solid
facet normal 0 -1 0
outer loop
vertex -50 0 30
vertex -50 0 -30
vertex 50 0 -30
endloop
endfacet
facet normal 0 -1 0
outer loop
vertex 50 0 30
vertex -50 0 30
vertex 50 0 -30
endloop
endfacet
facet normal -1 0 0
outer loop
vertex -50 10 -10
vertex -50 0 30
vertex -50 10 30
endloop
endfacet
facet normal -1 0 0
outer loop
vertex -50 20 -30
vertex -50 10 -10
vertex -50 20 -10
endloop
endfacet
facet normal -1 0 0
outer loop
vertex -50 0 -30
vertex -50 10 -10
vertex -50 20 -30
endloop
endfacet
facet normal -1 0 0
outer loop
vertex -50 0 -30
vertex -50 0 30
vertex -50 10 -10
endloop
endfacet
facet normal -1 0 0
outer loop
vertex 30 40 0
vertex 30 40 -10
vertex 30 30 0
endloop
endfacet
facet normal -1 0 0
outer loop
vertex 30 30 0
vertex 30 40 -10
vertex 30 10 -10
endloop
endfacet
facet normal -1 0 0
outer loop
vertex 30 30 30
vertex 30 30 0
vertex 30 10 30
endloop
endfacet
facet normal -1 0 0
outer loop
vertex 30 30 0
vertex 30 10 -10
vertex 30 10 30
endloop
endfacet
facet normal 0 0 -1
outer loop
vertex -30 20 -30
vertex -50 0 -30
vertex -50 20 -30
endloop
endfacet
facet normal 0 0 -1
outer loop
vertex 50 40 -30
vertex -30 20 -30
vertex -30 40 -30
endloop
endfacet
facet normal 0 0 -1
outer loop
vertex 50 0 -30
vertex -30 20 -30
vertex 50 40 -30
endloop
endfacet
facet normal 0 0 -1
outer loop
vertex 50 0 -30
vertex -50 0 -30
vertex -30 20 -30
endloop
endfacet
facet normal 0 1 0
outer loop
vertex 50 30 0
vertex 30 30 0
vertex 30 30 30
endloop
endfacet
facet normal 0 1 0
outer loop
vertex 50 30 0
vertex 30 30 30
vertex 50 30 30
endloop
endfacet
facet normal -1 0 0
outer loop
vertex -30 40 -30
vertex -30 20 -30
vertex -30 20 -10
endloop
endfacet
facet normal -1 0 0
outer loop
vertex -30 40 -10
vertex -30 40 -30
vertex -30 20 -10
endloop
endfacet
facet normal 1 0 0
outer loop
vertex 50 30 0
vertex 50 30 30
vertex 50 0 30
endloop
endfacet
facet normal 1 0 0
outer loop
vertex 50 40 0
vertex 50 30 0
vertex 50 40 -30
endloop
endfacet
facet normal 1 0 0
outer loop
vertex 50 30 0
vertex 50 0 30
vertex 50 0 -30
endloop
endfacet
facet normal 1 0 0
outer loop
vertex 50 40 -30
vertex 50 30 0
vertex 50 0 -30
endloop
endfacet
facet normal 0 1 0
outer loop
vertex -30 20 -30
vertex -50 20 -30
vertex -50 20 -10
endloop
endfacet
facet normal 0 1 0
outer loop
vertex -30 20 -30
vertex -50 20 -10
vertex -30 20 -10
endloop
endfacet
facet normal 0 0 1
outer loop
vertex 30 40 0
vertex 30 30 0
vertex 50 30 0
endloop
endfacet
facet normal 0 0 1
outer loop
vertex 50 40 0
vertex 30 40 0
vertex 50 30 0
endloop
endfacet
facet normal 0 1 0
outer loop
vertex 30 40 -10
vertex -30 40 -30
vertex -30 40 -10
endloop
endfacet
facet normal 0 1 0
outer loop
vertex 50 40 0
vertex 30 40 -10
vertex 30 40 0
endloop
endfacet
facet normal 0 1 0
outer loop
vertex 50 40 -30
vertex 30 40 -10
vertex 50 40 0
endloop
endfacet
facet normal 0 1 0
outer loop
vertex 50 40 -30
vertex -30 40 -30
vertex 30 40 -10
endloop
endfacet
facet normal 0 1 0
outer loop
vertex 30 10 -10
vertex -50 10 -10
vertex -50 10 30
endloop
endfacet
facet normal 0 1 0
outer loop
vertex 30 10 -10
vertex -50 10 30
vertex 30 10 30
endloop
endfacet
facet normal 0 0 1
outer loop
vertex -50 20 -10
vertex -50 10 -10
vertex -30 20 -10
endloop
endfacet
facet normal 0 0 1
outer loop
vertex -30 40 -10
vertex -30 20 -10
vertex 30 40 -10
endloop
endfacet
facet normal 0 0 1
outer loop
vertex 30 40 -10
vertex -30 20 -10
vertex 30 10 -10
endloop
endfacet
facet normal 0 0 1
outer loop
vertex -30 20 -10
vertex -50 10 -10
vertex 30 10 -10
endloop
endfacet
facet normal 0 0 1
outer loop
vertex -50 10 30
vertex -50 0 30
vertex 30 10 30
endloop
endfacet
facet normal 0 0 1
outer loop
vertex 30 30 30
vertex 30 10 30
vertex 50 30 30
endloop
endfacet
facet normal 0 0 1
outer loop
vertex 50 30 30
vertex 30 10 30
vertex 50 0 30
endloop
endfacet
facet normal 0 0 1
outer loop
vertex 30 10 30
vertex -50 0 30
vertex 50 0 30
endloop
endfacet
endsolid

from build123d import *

# Parameters (mm, degrees)
SALIENTE_EXTRUIR1_DEPTH = 10
CROQUIS1_3_W            = 20
CROQUIS1_3_H            = 30
SALIENTE_EXTRUIR2_DEPTH = 30
SALIENTE_EXTRUIR3_DEPTH = 40
CROQUIS1_5_W            = 20
CROQUIS1_5_H            = 20
SALIENTE_EXTRUIR4_DEPTH = 20


with BuildPart() as part:
    # Croquis1 → Saliente-Extruir1 (new body)
    with BuildSketch(Plane(origin=(0, 0, 0), x_dir=(1, 0, 0), z_dir=(0, 1, 0))):
        Polygon((-30, 10), (-50, 10), (-50, -30), (30, -30), (30, 0), (30, 10), align=None)
    extrude(amount=SALIENTE_EXTRUIR1_DEPTH)

    # Croquis1<3> → Saliente-Extruir2 (add)
    with BuildSketch(Plane(origin=(0, 0, 0), x_dir=(1, 0, 0), z_dir=(0, 1, 0))):
        with Locations((40, -15)):
            Rectangle(CROQUIS1_3_W, CROQUIS1_3_H)
    extrude(amount=SALIENTE_EXTRUIR2_DEPTH)

    # Croquis1<4> → Saliente-Extruir3 (add)
    with BuildSketch(Plane(origin=(0, 0, 0), x_dir=(1, 0, 0), z_dir=(0, 1, 0))):
        Polygon((30, 30), (-30, 30), (-30, 10), (30, 10), (30, 0), (50, 0), (50, 30), align=None)
    extrude(amount=SALIENTE_EXTRUIR3_DEPTH)

    # Croquis1<5> → Saliente-Extruir4 (add)
    with BuildSketch(Plane(origin=(0, 0, 0), x_dir=(1, 0, 0), z_dir=(0, 1, 0))):
        with Locations((-40, 20)):
            Rectangle(CROQUIS1_5_W, CROQUIS1_5_H)
    extrude(amount=SALIENTE_EXTRUIR4_DEPTH)


solid = part.part
